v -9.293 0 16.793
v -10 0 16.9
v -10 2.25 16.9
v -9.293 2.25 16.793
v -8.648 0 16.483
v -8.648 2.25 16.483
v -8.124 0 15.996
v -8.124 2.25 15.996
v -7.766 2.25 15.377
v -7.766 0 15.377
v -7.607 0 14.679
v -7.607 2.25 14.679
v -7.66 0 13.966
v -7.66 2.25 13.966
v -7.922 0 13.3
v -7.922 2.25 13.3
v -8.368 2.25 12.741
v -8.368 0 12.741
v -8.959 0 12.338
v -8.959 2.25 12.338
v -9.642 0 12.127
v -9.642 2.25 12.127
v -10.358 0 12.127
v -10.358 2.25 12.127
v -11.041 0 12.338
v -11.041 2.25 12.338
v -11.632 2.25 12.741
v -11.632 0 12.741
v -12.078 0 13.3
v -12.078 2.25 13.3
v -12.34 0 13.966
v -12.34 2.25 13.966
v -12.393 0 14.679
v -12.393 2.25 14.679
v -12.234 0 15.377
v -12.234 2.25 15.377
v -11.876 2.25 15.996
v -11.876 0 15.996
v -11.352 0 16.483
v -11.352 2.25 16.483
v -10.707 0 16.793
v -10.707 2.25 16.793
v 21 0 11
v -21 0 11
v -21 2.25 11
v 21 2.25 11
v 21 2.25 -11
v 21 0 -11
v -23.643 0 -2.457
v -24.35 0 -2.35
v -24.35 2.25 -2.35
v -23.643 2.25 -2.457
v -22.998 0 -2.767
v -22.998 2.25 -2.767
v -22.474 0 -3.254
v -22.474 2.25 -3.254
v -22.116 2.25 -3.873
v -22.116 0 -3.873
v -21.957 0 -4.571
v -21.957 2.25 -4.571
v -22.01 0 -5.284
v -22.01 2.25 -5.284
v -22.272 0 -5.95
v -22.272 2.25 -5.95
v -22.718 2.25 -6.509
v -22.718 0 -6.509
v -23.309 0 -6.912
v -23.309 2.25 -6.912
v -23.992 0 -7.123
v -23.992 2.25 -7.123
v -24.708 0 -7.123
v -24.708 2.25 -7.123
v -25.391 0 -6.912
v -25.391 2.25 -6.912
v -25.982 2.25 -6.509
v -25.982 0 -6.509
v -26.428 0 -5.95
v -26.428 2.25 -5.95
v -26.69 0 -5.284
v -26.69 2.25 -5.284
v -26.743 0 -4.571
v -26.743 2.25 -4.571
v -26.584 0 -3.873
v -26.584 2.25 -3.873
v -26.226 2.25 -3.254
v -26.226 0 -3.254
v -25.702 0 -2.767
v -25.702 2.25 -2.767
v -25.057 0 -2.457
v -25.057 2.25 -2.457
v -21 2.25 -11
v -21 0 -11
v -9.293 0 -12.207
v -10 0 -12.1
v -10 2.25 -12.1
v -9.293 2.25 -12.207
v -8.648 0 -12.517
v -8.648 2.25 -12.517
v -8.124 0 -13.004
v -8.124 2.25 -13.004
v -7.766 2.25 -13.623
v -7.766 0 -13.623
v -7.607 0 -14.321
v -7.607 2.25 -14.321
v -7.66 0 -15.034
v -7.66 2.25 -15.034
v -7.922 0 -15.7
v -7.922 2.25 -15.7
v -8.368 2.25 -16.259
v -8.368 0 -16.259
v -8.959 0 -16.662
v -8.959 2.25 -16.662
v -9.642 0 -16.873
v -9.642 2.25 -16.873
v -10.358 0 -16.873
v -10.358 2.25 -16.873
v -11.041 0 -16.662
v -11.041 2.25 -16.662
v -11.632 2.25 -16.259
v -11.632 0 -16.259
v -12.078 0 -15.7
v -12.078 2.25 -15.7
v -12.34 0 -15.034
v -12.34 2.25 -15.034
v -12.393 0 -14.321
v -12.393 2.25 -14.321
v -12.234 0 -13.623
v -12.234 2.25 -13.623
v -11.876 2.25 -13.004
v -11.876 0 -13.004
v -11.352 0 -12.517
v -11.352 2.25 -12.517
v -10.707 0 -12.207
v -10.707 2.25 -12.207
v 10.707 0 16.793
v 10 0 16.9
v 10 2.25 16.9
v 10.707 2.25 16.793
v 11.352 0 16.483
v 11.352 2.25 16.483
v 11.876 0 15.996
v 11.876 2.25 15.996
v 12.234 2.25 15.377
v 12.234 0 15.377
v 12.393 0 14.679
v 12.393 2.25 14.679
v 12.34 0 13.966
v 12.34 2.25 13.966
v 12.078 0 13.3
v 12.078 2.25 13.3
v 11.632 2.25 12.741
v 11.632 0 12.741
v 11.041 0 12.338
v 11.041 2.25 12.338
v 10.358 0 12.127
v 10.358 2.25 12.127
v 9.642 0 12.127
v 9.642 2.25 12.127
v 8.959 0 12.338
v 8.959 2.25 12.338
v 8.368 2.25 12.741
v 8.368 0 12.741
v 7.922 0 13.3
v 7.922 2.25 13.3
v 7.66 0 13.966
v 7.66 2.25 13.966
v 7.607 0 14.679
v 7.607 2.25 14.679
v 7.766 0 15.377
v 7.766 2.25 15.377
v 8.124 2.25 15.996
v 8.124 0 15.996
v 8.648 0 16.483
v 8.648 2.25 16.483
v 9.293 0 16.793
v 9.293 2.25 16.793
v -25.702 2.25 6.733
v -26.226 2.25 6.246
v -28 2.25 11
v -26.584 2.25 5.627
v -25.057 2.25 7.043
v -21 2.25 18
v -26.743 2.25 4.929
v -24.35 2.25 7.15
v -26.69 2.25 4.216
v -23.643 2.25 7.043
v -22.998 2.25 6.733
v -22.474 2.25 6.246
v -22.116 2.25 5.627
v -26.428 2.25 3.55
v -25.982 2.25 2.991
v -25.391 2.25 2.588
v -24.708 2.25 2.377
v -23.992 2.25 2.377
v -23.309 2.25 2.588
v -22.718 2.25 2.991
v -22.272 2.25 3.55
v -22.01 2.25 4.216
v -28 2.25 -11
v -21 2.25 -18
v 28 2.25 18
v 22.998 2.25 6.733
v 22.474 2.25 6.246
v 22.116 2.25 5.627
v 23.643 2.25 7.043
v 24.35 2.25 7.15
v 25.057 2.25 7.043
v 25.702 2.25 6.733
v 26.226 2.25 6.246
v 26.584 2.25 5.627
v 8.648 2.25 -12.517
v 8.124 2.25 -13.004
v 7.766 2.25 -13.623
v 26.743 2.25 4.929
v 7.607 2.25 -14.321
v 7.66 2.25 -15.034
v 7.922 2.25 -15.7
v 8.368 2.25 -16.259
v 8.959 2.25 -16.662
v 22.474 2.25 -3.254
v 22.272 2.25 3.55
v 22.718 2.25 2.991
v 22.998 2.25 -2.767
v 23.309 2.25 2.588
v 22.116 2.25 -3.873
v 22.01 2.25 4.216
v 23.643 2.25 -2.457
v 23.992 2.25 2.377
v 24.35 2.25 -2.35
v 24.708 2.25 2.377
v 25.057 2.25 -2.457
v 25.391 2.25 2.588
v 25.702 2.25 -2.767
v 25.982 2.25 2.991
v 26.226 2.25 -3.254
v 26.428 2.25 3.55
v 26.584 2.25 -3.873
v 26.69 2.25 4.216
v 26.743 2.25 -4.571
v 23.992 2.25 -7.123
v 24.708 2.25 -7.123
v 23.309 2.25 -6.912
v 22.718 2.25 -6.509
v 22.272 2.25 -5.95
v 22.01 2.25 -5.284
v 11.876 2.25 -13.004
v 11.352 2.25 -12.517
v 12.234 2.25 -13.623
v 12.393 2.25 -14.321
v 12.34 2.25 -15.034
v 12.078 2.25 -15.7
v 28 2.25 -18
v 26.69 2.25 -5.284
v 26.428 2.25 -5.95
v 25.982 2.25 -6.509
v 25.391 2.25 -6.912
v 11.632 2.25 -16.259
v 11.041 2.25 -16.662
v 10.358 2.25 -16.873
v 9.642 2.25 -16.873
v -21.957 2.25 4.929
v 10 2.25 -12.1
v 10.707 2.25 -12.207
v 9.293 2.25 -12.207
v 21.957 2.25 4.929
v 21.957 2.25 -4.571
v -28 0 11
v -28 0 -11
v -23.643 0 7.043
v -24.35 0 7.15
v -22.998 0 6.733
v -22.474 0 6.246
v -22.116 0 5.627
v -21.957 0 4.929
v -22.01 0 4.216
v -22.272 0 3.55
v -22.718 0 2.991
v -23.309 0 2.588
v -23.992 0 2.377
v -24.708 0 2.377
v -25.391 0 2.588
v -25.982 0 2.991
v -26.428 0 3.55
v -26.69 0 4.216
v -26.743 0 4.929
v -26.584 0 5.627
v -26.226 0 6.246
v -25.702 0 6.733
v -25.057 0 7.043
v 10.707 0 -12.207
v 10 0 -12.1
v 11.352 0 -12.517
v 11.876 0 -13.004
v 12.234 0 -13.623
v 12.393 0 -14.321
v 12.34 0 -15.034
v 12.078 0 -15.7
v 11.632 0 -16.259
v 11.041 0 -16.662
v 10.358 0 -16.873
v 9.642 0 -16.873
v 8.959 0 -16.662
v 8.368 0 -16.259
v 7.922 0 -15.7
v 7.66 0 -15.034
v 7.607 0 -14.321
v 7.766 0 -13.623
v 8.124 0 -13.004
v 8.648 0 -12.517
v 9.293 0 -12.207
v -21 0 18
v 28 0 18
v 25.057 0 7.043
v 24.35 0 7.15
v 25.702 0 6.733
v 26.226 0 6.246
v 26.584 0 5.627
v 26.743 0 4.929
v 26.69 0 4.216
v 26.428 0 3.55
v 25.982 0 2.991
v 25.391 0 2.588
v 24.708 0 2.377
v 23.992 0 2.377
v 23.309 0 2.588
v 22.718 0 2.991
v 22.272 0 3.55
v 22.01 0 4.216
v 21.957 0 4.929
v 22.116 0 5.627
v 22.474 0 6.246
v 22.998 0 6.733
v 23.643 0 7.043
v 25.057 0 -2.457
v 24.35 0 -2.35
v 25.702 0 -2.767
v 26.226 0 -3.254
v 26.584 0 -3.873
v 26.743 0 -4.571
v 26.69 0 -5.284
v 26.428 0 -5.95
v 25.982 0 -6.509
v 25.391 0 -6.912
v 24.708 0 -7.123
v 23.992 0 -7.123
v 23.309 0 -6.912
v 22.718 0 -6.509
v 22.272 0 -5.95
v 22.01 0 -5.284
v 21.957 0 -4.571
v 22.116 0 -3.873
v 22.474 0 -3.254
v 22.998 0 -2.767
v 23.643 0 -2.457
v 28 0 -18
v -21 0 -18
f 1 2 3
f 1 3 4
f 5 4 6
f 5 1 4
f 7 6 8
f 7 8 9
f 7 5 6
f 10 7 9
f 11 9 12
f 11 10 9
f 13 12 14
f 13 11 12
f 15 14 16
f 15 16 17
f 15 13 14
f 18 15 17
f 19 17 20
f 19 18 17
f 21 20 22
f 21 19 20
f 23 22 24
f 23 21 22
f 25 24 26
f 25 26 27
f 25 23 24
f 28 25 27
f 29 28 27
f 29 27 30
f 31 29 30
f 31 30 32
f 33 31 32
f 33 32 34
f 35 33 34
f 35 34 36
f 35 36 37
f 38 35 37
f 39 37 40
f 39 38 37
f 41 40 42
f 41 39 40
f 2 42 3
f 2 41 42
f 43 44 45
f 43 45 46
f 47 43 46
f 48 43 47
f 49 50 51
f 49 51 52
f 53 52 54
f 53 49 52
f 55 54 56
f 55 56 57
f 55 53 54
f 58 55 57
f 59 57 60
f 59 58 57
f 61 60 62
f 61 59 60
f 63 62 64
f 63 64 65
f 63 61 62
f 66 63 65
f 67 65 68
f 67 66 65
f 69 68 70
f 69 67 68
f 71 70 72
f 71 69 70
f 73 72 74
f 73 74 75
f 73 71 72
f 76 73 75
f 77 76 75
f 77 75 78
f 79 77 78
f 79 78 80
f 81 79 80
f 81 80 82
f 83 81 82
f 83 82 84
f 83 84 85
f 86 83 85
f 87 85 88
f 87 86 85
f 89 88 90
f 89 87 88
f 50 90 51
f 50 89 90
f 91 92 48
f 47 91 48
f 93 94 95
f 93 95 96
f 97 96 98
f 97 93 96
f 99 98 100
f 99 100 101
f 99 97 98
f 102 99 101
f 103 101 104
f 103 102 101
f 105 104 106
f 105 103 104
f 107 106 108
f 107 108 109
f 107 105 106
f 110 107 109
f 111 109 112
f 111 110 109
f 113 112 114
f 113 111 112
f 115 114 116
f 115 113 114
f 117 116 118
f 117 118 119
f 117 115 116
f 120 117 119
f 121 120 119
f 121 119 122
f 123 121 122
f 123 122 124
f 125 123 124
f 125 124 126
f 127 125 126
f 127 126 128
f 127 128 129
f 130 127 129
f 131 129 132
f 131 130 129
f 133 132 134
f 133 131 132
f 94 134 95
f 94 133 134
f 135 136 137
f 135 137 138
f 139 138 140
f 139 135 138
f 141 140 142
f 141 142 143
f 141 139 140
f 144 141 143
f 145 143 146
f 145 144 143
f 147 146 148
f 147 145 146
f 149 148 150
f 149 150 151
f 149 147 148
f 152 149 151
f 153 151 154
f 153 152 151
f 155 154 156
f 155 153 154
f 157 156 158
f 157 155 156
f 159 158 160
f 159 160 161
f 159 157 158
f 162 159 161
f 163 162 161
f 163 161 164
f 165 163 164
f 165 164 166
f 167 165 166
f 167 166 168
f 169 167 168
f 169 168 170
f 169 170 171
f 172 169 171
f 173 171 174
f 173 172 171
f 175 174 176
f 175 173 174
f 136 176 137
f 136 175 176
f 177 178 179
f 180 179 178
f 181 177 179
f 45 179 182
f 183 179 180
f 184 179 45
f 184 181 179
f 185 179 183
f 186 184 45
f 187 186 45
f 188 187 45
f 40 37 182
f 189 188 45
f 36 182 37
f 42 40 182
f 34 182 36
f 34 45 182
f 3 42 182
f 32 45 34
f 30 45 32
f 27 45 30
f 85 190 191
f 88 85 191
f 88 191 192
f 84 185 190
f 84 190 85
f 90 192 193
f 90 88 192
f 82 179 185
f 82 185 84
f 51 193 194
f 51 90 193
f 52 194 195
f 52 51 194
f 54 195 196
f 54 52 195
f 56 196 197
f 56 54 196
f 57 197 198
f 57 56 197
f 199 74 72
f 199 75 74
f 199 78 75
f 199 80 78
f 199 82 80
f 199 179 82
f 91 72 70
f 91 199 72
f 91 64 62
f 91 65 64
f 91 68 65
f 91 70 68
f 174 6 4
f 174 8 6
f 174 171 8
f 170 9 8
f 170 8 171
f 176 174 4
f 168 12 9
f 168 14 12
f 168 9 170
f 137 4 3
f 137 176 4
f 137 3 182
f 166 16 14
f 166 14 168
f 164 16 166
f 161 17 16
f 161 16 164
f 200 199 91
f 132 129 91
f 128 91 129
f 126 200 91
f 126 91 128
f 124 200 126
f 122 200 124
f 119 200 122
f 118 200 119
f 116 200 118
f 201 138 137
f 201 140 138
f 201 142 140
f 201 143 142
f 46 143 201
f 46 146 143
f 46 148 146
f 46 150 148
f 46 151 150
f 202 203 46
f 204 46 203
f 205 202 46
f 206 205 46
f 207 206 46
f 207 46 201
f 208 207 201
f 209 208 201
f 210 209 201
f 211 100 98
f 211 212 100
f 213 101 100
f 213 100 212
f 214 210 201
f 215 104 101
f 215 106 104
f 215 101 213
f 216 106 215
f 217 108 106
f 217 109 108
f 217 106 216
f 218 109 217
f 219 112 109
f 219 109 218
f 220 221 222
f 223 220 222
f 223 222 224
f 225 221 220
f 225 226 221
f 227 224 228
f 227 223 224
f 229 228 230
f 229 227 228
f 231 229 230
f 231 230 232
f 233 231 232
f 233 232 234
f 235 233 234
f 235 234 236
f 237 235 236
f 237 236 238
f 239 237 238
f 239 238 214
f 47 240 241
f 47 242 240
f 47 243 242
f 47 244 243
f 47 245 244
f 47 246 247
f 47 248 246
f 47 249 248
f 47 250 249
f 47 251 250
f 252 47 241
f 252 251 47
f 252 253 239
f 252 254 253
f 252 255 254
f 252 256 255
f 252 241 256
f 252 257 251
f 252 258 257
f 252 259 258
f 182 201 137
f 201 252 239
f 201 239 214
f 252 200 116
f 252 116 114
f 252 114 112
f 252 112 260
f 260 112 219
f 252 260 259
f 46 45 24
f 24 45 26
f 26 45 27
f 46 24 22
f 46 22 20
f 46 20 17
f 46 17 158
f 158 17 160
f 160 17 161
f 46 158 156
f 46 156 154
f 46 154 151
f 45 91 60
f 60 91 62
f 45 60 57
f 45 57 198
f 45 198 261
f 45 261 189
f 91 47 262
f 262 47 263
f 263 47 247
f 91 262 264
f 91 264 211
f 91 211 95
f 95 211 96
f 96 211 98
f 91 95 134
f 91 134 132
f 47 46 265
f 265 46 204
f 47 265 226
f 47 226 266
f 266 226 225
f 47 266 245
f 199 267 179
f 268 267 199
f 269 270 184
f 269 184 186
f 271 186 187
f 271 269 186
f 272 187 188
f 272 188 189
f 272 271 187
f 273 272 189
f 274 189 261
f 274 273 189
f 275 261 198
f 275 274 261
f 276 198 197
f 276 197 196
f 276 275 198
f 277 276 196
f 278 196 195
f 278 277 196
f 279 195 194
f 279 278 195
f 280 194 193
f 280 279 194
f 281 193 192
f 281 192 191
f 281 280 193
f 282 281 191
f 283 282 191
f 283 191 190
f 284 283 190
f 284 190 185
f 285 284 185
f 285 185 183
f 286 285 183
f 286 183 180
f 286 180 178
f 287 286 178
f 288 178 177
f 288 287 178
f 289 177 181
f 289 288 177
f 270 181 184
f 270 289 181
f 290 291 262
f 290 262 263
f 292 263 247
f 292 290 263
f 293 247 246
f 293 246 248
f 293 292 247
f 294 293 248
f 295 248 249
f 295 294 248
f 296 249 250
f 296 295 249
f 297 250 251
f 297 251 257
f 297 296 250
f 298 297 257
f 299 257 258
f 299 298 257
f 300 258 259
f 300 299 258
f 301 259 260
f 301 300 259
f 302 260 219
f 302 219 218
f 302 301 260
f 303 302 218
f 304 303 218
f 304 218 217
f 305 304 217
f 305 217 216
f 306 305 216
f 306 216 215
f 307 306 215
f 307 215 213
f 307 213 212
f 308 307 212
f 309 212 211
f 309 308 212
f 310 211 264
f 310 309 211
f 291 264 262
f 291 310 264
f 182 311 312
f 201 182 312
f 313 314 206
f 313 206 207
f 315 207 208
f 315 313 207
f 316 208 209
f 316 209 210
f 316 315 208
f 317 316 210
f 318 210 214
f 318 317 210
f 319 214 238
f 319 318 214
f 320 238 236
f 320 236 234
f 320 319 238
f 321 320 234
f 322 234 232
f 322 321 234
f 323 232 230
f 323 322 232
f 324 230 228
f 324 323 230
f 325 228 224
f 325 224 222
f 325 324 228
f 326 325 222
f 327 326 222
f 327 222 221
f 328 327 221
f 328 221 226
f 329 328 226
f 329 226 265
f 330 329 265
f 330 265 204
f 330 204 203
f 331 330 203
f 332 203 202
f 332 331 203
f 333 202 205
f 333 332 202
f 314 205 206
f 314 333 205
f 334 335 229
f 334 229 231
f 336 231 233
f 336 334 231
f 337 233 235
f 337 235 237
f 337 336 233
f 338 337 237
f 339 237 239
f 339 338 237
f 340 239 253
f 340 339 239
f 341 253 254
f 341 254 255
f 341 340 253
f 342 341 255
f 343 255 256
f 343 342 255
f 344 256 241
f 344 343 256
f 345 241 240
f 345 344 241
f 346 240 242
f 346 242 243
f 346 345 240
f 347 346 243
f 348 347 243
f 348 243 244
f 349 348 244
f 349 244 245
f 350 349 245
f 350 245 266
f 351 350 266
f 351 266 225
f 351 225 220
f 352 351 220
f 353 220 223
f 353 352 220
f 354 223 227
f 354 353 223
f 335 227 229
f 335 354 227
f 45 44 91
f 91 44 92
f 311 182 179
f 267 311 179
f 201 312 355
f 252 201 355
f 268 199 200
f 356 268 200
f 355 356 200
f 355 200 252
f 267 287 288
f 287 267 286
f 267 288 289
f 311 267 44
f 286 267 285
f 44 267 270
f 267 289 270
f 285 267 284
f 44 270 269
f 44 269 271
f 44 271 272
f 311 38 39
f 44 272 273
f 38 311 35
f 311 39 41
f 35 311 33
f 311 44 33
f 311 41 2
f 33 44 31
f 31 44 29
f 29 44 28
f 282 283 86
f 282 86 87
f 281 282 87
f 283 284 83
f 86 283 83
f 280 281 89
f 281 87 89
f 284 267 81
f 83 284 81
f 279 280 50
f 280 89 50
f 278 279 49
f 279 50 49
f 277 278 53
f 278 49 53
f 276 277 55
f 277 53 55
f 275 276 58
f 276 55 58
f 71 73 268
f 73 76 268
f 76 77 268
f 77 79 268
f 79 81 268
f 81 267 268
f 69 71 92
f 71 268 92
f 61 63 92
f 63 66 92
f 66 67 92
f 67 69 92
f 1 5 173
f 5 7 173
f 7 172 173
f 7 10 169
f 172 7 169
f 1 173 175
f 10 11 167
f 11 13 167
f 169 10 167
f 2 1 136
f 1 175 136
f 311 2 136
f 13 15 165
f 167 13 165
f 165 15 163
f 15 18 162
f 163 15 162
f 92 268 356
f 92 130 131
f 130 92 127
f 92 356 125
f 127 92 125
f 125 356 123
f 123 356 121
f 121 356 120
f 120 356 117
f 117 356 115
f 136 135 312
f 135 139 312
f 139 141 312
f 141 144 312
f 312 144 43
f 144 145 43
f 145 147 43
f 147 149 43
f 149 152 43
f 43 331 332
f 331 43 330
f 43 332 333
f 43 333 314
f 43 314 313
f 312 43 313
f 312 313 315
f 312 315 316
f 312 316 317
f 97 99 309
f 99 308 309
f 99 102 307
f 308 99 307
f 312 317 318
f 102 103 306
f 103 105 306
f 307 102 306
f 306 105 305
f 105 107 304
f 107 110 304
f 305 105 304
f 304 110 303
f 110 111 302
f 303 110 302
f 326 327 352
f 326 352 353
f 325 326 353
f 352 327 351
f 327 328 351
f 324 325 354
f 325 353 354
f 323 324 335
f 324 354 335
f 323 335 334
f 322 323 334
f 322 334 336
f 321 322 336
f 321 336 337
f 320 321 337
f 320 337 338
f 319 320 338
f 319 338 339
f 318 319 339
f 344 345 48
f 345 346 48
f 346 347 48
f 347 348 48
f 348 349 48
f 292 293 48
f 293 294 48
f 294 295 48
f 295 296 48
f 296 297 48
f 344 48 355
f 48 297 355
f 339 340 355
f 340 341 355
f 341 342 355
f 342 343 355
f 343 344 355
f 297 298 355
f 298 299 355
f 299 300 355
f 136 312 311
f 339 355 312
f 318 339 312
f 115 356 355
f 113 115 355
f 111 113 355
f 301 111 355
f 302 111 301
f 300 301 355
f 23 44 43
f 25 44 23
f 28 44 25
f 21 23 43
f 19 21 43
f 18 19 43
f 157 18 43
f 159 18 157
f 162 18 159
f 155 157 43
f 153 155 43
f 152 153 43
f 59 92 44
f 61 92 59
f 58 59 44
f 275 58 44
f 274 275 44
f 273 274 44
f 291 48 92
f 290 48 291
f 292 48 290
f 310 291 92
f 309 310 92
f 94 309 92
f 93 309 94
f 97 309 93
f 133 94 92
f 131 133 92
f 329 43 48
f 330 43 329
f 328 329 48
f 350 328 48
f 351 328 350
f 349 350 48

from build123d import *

# Parameters (mm, degrees)
SKETCH1_W           = 56
SKETCH1_H           = 36
SKETCH1_R           = 2.4
SKETCH1_W_2         = 42
SKETCH1_H_2         = 22
BOSS_EXTRUDE1_DEPTH = 2.25
CUT_EXTRUDE1_DEPTH  = 2.25


with BuildPart() as part:
    # Sketch1 → Boss-Extrude1 (new body)
    with BuildSketch(Plane(origin=(0, 0, 0), x_dir=(1, 0, 0), z_dir=(0, 1, 0))):
        Rectangle(SKETCH1_W, SKETCH1_H)
        with Locations(Location((24.35, -4.75, 0), (0, 0, 270))):
            Circle(SKETCH1_R, mode=Mode.SUBTRACT)
        with Locations(Location((24.35, 4.75, 0), (0, 0, 270))):
            Circle(SKETCH1_R, mode=Mode.SUBTRACT)
        with Locations(Location((-24.35, -4.75, 0), (0, 0, 270))):
            Circle(SKETCH1_R, mode=Mode.SUBTRACT)
        with Locations(Location((-24.35, 4.75, 0), (0, 0, 270))):
            Circle(SKETCH1_R, mode=Mode.SUBTRACT)
        with Locations(Location((10, 14.5, 0), (0, 0, 270))):
            Circle(SKETCH1_R, mode=Mode.SUBTRACT)
        with Locations(Location((10, -14.5, 0), (0, 0, 270))):
            Circle(SKETCH1_R, mode=Mode.SUBTRACT)
        with Locations(Location((-10, -14.5, 0), (0, 0, 270))):
            Circle(SKETCH1_R, mode=Mode.SUBTRACT)
        with Locations(Location((-10, 14.5, 0), (0, 0, 270))):
            Circle(SKETCH1_R, mode=Mode.SUBTRACT)
        Rectangle(SKETCH1_W_2, SKETCH1_H_2, mode=Mode.SUBTRACT)
    extrude(amount=BOSS_EXTRUDE1_DEPTH)

    # Sketch2 → Cut-Extrude1 (cut)
    with BuildSketch(Plane(origin=(0, 2.25, 0), x_dir=(1, 0, 0), z_dir=(0, 1, 0))):
        Polygon((-28, 11), (-21, 18), (-28, 18), align=None)
        Polygon((-21, -18), (-28, -11), (-28, -18), align=None)
    extrude(amount=-CUT_EXTRUDE1_DEPTH, mode=Mode.SUBTRACT)


solid = part.part
